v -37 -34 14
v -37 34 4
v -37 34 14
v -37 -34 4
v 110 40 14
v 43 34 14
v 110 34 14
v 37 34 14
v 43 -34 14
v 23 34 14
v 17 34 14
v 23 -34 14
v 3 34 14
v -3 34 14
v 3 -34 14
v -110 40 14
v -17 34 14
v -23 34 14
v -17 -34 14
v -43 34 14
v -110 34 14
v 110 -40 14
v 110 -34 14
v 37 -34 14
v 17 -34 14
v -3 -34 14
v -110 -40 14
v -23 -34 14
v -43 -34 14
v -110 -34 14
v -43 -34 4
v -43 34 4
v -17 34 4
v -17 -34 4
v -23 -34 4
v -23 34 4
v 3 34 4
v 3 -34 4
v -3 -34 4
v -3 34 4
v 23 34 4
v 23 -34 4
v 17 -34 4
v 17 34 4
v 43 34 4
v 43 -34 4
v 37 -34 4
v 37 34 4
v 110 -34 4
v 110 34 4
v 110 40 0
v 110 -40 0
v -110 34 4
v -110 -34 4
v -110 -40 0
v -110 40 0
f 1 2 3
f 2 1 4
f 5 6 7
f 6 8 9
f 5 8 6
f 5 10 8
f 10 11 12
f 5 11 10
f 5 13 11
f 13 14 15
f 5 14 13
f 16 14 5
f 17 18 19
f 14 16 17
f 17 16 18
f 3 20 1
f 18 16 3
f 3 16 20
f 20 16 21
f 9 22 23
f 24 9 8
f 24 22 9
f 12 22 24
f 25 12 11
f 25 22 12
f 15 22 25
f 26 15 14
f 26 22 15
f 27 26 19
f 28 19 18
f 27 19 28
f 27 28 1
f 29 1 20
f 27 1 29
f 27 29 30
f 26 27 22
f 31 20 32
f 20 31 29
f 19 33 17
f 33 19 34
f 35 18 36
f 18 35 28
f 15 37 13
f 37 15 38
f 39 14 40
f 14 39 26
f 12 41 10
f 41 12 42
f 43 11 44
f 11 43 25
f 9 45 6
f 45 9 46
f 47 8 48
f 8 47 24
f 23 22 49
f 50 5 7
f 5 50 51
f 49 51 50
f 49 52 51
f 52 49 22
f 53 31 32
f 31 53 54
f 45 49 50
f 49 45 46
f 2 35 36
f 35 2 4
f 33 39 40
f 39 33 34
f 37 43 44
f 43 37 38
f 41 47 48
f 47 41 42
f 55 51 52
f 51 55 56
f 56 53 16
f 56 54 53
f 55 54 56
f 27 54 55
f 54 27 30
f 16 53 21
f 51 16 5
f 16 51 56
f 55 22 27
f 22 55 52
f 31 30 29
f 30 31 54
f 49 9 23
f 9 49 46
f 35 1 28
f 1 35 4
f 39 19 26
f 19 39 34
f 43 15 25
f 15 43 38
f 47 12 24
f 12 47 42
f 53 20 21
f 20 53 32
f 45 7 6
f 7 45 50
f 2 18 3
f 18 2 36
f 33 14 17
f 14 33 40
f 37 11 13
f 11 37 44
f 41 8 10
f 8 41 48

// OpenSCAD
$fn = 32;

// ----------------------------------------------------------------------
// Rib frame 220 x 80 x 14
// 5 ribs at 20 mm pitch
// ----------------------------------------------------------------------

// --- parameters (mm) ---
frame = [220, 80, 4];  // base plate size (x, y, z)
rail_w = 6;            // side rail width
ribs = 5;              // number of ribs
rib_t = 6;             // rib thickness
rib_h = 10;            // rib height above the base plate
pitch = 20;            // pitch between rib centres

// --- derived feature positions (mm) ---
span = (ribs - 1) * pitch;          // = 80   distance between the outer ribs
origin_x = -span / 2;               // = -40   X of the first rib
rib_len = frame[1] - 2 * rail_w + 2;  // = 70   rib length, 1 mm into each rail
feature_centers = [
  [origin_x + 0 * pitch, 0],
  [origin_x + 1 * pitch, 0],
  [origin_x + 2 * pitch, 0],
  [origin_x + 3 * pitch, 0],
  [origin_x + 4 * pitch, 0]
];   // rib centre line, drives the rib loop

// base plate, two side rails, then the ribs read straight off feature_centers
union() {
  translate([-frame[0] / 2, -frame[1] / 2, 0]) cube(frame);
  translate([-frame[0] / 2, -frame[1] / 2, 0]) cube([frame[0], rail_w, frame[2] + rib_h]);
  translate([-frame[0] / 2, frame[1] / 2 - rail_w, 0]) cube([frame[0], rail_w, frame[2] + rib_h]);
  for (centre = feature_centers)
    translate([centre[0] - rib_t / 2, centre[1] - rib_len / 2, frame[2] - 1])
      cube([rib_t, rib_len, rib_h + 1]);
}
